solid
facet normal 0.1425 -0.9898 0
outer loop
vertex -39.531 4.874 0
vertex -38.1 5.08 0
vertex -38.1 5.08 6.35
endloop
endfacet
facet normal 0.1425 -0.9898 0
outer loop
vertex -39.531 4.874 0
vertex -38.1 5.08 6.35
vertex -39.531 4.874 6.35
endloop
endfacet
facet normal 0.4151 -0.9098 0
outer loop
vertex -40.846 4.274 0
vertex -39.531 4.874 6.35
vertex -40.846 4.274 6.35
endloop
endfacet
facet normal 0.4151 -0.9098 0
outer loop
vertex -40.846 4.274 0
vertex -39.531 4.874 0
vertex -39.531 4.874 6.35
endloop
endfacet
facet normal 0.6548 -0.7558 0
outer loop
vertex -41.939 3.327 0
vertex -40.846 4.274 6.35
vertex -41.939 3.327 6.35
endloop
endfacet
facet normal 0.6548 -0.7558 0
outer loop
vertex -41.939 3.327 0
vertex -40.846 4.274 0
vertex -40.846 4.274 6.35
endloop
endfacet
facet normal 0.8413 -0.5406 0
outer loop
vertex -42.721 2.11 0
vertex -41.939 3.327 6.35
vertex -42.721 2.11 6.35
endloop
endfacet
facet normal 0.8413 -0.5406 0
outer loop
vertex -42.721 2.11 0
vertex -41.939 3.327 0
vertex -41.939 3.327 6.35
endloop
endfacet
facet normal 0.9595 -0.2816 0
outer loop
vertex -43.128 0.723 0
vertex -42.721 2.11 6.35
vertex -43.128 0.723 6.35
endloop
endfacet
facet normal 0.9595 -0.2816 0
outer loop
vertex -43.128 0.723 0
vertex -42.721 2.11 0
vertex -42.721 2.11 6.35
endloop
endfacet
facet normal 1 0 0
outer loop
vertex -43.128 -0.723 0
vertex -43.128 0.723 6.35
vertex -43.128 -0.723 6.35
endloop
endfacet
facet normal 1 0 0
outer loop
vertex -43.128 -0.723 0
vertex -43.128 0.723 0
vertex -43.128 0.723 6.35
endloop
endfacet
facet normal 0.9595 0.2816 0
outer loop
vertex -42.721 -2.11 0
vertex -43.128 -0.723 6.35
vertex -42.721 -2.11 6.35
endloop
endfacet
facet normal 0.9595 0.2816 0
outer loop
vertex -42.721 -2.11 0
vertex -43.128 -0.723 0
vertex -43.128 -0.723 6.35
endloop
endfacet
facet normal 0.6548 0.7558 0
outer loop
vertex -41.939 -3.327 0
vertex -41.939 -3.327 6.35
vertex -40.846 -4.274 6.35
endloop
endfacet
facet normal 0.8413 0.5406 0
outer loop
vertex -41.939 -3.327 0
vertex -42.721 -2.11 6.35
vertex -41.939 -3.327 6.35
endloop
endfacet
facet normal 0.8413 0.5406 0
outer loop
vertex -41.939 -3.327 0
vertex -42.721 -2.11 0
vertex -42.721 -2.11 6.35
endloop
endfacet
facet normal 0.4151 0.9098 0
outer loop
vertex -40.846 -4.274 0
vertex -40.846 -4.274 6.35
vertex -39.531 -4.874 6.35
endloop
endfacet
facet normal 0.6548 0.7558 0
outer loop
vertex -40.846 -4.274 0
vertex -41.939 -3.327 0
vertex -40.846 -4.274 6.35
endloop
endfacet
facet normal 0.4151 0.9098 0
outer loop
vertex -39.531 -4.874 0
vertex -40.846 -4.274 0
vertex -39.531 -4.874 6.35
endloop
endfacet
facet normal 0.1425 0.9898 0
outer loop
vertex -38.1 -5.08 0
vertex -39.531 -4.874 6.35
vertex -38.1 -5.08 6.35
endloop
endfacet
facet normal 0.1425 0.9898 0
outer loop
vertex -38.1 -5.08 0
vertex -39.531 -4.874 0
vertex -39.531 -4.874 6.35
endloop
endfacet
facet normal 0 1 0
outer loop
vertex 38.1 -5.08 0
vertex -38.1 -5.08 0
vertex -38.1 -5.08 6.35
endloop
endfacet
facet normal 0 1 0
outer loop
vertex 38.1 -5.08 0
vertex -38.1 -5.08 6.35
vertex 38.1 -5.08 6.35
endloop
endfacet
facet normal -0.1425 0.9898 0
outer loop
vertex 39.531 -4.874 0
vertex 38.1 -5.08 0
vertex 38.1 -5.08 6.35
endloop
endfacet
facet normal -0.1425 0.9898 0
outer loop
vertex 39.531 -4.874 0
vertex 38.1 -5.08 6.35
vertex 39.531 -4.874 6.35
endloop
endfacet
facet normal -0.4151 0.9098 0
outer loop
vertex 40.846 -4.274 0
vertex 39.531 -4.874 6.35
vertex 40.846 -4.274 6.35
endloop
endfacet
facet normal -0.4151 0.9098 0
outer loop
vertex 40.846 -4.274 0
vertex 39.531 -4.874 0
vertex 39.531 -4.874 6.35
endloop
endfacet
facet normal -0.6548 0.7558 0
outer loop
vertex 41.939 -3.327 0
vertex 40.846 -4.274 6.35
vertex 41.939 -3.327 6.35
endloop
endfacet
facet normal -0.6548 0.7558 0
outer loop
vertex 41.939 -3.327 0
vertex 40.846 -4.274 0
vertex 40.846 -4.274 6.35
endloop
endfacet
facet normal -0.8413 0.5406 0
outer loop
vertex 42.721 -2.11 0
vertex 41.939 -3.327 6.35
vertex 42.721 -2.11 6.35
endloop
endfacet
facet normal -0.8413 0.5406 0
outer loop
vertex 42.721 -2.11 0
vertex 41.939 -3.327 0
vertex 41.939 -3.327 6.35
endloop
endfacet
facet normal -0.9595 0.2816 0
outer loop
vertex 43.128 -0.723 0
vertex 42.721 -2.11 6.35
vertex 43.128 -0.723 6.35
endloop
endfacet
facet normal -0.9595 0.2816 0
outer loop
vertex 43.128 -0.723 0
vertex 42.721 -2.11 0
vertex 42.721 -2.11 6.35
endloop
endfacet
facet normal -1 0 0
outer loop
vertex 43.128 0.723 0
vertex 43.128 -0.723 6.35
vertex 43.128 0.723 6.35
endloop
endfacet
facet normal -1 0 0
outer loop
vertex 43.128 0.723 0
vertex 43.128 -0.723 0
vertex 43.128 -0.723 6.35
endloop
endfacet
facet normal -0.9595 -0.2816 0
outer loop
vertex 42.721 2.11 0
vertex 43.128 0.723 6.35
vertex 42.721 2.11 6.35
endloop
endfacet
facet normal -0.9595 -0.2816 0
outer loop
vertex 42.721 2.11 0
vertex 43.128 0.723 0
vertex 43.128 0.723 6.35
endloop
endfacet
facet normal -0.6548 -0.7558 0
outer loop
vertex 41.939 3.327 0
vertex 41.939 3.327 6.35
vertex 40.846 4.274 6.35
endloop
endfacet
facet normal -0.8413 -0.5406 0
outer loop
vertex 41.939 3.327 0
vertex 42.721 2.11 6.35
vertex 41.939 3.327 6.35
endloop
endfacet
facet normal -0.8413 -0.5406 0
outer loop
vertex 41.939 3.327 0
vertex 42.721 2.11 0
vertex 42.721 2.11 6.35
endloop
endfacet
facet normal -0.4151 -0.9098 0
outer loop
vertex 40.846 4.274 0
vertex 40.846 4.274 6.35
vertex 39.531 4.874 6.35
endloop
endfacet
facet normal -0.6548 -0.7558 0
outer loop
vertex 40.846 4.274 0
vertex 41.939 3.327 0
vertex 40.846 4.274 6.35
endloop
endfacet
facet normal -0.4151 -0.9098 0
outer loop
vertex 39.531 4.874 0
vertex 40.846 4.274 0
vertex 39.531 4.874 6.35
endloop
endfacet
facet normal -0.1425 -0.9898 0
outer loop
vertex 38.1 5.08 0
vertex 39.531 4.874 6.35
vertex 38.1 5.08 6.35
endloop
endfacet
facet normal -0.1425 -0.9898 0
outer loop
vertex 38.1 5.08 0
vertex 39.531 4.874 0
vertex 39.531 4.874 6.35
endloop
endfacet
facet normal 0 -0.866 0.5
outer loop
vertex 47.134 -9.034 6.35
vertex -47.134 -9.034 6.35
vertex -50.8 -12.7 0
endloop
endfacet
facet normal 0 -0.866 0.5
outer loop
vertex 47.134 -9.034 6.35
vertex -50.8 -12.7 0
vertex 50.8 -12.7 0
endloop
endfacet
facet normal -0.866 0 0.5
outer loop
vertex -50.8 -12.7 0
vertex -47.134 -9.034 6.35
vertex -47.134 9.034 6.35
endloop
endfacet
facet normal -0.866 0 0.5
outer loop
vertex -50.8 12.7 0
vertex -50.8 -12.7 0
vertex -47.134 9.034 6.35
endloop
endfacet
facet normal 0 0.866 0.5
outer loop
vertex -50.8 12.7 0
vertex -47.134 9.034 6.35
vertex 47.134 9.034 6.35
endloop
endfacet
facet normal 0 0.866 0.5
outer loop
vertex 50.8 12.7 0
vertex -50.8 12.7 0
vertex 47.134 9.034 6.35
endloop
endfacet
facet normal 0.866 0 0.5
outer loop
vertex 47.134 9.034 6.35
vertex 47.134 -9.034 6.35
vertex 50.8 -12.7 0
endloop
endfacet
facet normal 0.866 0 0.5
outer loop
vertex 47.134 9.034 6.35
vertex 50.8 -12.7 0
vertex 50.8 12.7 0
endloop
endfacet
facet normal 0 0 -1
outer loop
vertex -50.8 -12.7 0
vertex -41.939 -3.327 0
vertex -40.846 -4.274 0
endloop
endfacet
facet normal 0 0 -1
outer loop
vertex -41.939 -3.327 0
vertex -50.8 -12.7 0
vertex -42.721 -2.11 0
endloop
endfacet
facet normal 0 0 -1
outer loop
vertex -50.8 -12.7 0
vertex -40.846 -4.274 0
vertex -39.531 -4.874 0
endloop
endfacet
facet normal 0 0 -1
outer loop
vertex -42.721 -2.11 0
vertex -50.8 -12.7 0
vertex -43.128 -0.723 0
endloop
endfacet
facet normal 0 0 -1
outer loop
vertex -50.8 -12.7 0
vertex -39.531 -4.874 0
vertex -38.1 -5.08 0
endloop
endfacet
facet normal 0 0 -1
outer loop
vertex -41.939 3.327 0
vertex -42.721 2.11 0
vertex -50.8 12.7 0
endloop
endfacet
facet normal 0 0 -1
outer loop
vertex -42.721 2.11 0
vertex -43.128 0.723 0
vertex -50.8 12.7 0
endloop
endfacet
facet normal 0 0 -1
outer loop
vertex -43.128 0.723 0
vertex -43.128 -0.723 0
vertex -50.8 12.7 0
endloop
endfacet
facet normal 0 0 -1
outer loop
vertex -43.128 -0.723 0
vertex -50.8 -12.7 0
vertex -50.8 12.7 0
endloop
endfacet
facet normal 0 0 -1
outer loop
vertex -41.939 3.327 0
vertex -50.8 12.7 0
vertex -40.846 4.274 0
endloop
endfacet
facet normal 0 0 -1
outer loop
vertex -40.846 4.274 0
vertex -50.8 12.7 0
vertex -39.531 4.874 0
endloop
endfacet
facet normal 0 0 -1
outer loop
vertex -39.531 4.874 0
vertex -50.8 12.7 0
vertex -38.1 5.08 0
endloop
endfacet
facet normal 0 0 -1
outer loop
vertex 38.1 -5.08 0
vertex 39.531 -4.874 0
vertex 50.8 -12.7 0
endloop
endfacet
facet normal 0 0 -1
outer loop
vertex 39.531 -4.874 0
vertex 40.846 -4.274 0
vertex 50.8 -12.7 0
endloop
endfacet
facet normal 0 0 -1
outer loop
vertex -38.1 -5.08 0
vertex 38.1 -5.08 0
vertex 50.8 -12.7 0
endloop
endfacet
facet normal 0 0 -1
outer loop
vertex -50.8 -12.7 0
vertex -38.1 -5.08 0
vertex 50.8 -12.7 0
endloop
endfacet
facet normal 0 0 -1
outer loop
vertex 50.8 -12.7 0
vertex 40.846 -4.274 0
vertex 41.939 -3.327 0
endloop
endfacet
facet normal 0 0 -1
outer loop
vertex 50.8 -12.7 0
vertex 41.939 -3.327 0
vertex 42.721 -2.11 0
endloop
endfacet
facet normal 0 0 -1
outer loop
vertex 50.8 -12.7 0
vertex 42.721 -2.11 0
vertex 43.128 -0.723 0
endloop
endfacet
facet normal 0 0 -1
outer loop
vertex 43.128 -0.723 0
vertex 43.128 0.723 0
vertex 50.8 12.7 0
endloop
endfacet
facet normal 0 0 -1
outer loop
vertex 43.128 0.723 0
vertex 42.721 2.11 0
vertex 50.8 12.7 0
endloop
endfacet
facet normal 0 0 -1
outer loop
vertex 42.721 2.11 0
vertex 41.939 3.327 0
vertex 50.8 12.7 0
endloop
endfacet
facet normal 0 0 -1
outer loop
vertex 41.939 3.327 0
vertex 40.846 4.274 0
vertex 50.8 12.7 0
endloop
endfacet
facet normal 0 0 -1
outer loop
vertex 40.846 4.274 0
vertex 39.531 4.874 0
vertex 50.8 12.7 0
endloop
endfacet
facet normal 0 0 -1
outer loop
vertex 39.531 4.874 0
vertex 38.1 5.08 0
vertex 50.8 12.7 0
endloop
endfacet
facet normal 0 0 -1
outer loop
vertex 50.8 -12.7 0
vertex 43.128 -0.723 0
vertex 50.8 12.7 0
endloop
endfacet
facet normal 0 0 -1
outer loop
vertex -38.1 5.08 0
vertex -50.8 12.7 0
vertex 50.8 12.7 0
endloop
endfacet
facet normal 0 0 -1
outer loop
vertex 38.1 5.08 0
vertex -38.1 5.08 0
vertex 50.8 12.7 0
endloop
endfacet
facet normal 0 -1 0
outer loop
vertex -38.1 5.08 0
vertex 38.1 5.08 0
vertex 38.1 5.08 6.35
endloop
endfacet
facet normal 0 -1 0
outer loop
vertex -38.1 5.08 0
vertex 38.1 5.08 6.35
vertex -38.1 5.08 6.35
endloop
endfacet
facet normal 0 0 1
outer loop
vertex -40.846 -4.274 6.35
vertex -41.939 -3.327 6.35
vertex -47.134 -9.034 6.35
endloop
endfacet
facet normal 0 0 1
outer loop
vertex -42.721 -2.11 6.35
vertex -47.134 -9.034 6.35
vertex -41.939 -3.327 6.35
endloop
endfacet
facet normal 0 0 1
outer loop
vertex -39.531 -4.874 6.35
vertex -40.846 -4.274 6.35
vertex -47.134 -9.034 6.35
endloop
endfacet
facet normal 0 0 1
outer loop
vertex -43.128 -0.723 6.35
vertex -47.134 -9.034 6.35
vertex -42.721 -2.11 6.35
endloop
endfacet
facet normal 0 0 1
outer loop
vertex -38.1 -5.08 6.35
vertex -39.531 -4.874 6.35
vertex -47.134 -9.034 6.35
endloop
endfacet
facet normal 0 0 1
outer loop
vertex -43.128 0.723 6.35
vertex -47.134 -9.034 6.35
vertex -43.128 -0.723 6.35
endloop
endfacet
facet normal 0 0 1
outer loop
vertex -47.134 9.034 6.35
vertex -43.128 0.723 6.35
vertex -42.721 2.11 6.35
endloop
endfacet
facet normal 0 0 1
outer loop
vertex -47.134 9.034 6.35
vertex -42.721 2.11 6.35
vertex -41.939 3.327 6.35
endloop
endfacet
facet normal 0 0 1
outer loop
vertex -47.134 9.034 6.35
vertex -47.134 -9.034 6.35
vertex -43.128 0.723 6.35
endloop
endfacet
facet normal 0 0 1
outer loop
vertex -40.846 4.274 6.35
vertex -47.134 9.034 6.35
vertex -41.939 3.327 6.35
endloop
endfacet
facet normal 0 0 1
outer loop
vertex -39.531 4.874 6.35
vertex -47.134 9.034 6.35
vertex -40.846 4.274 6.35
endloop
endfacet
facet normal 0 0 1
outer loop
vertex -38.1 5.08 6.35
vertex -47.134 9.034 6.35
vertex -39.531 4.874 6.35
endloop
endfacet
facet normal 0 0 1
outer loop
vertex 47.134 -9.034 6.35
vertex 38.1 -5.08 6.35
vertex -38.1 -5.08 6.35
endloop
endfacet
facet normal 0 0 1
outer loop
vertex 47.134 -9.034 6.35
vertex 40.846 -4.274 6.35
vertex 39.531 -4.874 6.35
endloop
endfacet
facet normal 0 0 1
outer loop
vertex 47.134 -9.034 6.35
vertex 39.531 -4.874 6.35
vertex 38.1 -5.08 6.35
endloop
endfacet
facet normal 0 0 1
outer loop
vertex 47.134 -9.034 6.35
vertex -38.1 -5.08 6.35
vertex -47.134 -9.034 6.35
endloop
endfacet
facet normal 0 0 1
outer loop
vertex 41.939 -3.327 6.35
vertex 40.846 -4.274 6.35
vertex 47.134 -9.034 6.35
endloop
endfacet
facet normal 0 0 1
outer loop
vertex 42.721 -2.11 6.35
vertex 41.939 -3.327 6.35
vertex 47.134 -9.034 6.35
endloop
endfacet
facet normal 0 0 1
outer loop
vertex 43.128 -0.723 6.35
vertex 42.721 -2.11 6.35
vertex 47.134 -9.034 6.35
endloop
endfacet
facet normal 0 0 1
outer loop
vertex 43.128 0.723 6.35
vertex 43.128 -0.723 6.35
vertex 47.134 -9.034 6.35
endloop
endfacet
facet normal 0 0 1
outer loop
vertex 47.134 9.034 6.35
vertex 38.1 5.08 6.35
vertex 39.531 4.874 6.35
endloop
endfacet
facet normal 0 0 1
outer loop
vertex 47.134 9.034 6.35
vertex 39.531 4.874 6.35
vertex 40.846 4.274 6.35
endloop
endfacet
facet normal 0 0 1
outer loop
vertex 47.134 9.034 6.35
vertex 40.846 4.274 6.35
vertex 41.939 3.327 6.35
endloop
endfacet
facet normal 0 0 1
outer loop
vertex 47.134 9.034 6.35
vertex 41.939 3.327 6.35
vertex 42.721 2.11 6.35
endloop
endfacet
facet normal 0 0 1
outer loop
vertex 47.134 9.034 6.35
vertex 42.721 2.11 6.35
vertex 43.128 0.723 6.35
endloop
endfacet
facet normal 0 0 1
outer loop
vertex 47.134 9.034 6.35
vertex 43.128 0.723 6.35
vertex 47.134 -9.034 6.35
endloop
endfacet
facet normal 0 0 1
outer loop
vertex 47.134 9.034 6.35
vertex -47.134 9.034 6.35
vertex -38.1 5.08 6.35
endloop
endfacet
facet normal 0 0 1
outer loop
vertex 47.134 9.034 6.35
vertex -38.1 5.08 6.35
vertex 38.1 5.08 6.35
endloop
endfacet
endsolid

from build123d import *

# Parameters (mm, degrees)
F0_W     = 101.6
F0_H     = 25.4
F1_DEPTH = 6.35
F2_SIZE2 = 3.666164
F2_SIZE  = 6.34999
F4_DEPTH = 42.2284360975


# Not quite as in the source:
# - a fillet or chamfer is up to 0.001 mm smaller than in the source, because OpenCascade refuses the exact size


with BuildPart() as f1:
    # F0 (on Top) → F1 (new body)
    with BuildSketch(Plane.XY):
        Rectangle(F0_W, F0_H)
    extrude(amount=F1_DEPTH)

    # F2 (size 6.35 and 3.6661742094 in the source; OpenCascade refuses exactly that, so slightly less here)
    f2_edges = [f1.edges().sort_by_distance(p)[0] for p in [
        (0, 12.7, 6.35),
        (-50.8, 0, 6.35),
        (0, -12.7, 6.35),
        (50.8, 0, 6.35),
    ]]
    chamfer(f2_edges, length=F2_SIZE, length2=F2_SIZE2)

    # F3 (on face) → F4 (cut)
    with BuildSketch(Plane.XY):
        with BuildLine():
            ThreePointArc((-38.1, 5.08), (-43.18, 0), (-38.1, -5.08))
            Line((-38.1, -5.08), (38.1, -5.08))
            ThreePointArc((38.1, -5.08), (43.18, 0), (38.1, 5.08))
            Line((38.1, 5.08), (-38.1, 5.08))
        make_face()
    extrude(amount=F4_DEPTH, mode=Mode.SUBTRACT)


solid = f1.part
